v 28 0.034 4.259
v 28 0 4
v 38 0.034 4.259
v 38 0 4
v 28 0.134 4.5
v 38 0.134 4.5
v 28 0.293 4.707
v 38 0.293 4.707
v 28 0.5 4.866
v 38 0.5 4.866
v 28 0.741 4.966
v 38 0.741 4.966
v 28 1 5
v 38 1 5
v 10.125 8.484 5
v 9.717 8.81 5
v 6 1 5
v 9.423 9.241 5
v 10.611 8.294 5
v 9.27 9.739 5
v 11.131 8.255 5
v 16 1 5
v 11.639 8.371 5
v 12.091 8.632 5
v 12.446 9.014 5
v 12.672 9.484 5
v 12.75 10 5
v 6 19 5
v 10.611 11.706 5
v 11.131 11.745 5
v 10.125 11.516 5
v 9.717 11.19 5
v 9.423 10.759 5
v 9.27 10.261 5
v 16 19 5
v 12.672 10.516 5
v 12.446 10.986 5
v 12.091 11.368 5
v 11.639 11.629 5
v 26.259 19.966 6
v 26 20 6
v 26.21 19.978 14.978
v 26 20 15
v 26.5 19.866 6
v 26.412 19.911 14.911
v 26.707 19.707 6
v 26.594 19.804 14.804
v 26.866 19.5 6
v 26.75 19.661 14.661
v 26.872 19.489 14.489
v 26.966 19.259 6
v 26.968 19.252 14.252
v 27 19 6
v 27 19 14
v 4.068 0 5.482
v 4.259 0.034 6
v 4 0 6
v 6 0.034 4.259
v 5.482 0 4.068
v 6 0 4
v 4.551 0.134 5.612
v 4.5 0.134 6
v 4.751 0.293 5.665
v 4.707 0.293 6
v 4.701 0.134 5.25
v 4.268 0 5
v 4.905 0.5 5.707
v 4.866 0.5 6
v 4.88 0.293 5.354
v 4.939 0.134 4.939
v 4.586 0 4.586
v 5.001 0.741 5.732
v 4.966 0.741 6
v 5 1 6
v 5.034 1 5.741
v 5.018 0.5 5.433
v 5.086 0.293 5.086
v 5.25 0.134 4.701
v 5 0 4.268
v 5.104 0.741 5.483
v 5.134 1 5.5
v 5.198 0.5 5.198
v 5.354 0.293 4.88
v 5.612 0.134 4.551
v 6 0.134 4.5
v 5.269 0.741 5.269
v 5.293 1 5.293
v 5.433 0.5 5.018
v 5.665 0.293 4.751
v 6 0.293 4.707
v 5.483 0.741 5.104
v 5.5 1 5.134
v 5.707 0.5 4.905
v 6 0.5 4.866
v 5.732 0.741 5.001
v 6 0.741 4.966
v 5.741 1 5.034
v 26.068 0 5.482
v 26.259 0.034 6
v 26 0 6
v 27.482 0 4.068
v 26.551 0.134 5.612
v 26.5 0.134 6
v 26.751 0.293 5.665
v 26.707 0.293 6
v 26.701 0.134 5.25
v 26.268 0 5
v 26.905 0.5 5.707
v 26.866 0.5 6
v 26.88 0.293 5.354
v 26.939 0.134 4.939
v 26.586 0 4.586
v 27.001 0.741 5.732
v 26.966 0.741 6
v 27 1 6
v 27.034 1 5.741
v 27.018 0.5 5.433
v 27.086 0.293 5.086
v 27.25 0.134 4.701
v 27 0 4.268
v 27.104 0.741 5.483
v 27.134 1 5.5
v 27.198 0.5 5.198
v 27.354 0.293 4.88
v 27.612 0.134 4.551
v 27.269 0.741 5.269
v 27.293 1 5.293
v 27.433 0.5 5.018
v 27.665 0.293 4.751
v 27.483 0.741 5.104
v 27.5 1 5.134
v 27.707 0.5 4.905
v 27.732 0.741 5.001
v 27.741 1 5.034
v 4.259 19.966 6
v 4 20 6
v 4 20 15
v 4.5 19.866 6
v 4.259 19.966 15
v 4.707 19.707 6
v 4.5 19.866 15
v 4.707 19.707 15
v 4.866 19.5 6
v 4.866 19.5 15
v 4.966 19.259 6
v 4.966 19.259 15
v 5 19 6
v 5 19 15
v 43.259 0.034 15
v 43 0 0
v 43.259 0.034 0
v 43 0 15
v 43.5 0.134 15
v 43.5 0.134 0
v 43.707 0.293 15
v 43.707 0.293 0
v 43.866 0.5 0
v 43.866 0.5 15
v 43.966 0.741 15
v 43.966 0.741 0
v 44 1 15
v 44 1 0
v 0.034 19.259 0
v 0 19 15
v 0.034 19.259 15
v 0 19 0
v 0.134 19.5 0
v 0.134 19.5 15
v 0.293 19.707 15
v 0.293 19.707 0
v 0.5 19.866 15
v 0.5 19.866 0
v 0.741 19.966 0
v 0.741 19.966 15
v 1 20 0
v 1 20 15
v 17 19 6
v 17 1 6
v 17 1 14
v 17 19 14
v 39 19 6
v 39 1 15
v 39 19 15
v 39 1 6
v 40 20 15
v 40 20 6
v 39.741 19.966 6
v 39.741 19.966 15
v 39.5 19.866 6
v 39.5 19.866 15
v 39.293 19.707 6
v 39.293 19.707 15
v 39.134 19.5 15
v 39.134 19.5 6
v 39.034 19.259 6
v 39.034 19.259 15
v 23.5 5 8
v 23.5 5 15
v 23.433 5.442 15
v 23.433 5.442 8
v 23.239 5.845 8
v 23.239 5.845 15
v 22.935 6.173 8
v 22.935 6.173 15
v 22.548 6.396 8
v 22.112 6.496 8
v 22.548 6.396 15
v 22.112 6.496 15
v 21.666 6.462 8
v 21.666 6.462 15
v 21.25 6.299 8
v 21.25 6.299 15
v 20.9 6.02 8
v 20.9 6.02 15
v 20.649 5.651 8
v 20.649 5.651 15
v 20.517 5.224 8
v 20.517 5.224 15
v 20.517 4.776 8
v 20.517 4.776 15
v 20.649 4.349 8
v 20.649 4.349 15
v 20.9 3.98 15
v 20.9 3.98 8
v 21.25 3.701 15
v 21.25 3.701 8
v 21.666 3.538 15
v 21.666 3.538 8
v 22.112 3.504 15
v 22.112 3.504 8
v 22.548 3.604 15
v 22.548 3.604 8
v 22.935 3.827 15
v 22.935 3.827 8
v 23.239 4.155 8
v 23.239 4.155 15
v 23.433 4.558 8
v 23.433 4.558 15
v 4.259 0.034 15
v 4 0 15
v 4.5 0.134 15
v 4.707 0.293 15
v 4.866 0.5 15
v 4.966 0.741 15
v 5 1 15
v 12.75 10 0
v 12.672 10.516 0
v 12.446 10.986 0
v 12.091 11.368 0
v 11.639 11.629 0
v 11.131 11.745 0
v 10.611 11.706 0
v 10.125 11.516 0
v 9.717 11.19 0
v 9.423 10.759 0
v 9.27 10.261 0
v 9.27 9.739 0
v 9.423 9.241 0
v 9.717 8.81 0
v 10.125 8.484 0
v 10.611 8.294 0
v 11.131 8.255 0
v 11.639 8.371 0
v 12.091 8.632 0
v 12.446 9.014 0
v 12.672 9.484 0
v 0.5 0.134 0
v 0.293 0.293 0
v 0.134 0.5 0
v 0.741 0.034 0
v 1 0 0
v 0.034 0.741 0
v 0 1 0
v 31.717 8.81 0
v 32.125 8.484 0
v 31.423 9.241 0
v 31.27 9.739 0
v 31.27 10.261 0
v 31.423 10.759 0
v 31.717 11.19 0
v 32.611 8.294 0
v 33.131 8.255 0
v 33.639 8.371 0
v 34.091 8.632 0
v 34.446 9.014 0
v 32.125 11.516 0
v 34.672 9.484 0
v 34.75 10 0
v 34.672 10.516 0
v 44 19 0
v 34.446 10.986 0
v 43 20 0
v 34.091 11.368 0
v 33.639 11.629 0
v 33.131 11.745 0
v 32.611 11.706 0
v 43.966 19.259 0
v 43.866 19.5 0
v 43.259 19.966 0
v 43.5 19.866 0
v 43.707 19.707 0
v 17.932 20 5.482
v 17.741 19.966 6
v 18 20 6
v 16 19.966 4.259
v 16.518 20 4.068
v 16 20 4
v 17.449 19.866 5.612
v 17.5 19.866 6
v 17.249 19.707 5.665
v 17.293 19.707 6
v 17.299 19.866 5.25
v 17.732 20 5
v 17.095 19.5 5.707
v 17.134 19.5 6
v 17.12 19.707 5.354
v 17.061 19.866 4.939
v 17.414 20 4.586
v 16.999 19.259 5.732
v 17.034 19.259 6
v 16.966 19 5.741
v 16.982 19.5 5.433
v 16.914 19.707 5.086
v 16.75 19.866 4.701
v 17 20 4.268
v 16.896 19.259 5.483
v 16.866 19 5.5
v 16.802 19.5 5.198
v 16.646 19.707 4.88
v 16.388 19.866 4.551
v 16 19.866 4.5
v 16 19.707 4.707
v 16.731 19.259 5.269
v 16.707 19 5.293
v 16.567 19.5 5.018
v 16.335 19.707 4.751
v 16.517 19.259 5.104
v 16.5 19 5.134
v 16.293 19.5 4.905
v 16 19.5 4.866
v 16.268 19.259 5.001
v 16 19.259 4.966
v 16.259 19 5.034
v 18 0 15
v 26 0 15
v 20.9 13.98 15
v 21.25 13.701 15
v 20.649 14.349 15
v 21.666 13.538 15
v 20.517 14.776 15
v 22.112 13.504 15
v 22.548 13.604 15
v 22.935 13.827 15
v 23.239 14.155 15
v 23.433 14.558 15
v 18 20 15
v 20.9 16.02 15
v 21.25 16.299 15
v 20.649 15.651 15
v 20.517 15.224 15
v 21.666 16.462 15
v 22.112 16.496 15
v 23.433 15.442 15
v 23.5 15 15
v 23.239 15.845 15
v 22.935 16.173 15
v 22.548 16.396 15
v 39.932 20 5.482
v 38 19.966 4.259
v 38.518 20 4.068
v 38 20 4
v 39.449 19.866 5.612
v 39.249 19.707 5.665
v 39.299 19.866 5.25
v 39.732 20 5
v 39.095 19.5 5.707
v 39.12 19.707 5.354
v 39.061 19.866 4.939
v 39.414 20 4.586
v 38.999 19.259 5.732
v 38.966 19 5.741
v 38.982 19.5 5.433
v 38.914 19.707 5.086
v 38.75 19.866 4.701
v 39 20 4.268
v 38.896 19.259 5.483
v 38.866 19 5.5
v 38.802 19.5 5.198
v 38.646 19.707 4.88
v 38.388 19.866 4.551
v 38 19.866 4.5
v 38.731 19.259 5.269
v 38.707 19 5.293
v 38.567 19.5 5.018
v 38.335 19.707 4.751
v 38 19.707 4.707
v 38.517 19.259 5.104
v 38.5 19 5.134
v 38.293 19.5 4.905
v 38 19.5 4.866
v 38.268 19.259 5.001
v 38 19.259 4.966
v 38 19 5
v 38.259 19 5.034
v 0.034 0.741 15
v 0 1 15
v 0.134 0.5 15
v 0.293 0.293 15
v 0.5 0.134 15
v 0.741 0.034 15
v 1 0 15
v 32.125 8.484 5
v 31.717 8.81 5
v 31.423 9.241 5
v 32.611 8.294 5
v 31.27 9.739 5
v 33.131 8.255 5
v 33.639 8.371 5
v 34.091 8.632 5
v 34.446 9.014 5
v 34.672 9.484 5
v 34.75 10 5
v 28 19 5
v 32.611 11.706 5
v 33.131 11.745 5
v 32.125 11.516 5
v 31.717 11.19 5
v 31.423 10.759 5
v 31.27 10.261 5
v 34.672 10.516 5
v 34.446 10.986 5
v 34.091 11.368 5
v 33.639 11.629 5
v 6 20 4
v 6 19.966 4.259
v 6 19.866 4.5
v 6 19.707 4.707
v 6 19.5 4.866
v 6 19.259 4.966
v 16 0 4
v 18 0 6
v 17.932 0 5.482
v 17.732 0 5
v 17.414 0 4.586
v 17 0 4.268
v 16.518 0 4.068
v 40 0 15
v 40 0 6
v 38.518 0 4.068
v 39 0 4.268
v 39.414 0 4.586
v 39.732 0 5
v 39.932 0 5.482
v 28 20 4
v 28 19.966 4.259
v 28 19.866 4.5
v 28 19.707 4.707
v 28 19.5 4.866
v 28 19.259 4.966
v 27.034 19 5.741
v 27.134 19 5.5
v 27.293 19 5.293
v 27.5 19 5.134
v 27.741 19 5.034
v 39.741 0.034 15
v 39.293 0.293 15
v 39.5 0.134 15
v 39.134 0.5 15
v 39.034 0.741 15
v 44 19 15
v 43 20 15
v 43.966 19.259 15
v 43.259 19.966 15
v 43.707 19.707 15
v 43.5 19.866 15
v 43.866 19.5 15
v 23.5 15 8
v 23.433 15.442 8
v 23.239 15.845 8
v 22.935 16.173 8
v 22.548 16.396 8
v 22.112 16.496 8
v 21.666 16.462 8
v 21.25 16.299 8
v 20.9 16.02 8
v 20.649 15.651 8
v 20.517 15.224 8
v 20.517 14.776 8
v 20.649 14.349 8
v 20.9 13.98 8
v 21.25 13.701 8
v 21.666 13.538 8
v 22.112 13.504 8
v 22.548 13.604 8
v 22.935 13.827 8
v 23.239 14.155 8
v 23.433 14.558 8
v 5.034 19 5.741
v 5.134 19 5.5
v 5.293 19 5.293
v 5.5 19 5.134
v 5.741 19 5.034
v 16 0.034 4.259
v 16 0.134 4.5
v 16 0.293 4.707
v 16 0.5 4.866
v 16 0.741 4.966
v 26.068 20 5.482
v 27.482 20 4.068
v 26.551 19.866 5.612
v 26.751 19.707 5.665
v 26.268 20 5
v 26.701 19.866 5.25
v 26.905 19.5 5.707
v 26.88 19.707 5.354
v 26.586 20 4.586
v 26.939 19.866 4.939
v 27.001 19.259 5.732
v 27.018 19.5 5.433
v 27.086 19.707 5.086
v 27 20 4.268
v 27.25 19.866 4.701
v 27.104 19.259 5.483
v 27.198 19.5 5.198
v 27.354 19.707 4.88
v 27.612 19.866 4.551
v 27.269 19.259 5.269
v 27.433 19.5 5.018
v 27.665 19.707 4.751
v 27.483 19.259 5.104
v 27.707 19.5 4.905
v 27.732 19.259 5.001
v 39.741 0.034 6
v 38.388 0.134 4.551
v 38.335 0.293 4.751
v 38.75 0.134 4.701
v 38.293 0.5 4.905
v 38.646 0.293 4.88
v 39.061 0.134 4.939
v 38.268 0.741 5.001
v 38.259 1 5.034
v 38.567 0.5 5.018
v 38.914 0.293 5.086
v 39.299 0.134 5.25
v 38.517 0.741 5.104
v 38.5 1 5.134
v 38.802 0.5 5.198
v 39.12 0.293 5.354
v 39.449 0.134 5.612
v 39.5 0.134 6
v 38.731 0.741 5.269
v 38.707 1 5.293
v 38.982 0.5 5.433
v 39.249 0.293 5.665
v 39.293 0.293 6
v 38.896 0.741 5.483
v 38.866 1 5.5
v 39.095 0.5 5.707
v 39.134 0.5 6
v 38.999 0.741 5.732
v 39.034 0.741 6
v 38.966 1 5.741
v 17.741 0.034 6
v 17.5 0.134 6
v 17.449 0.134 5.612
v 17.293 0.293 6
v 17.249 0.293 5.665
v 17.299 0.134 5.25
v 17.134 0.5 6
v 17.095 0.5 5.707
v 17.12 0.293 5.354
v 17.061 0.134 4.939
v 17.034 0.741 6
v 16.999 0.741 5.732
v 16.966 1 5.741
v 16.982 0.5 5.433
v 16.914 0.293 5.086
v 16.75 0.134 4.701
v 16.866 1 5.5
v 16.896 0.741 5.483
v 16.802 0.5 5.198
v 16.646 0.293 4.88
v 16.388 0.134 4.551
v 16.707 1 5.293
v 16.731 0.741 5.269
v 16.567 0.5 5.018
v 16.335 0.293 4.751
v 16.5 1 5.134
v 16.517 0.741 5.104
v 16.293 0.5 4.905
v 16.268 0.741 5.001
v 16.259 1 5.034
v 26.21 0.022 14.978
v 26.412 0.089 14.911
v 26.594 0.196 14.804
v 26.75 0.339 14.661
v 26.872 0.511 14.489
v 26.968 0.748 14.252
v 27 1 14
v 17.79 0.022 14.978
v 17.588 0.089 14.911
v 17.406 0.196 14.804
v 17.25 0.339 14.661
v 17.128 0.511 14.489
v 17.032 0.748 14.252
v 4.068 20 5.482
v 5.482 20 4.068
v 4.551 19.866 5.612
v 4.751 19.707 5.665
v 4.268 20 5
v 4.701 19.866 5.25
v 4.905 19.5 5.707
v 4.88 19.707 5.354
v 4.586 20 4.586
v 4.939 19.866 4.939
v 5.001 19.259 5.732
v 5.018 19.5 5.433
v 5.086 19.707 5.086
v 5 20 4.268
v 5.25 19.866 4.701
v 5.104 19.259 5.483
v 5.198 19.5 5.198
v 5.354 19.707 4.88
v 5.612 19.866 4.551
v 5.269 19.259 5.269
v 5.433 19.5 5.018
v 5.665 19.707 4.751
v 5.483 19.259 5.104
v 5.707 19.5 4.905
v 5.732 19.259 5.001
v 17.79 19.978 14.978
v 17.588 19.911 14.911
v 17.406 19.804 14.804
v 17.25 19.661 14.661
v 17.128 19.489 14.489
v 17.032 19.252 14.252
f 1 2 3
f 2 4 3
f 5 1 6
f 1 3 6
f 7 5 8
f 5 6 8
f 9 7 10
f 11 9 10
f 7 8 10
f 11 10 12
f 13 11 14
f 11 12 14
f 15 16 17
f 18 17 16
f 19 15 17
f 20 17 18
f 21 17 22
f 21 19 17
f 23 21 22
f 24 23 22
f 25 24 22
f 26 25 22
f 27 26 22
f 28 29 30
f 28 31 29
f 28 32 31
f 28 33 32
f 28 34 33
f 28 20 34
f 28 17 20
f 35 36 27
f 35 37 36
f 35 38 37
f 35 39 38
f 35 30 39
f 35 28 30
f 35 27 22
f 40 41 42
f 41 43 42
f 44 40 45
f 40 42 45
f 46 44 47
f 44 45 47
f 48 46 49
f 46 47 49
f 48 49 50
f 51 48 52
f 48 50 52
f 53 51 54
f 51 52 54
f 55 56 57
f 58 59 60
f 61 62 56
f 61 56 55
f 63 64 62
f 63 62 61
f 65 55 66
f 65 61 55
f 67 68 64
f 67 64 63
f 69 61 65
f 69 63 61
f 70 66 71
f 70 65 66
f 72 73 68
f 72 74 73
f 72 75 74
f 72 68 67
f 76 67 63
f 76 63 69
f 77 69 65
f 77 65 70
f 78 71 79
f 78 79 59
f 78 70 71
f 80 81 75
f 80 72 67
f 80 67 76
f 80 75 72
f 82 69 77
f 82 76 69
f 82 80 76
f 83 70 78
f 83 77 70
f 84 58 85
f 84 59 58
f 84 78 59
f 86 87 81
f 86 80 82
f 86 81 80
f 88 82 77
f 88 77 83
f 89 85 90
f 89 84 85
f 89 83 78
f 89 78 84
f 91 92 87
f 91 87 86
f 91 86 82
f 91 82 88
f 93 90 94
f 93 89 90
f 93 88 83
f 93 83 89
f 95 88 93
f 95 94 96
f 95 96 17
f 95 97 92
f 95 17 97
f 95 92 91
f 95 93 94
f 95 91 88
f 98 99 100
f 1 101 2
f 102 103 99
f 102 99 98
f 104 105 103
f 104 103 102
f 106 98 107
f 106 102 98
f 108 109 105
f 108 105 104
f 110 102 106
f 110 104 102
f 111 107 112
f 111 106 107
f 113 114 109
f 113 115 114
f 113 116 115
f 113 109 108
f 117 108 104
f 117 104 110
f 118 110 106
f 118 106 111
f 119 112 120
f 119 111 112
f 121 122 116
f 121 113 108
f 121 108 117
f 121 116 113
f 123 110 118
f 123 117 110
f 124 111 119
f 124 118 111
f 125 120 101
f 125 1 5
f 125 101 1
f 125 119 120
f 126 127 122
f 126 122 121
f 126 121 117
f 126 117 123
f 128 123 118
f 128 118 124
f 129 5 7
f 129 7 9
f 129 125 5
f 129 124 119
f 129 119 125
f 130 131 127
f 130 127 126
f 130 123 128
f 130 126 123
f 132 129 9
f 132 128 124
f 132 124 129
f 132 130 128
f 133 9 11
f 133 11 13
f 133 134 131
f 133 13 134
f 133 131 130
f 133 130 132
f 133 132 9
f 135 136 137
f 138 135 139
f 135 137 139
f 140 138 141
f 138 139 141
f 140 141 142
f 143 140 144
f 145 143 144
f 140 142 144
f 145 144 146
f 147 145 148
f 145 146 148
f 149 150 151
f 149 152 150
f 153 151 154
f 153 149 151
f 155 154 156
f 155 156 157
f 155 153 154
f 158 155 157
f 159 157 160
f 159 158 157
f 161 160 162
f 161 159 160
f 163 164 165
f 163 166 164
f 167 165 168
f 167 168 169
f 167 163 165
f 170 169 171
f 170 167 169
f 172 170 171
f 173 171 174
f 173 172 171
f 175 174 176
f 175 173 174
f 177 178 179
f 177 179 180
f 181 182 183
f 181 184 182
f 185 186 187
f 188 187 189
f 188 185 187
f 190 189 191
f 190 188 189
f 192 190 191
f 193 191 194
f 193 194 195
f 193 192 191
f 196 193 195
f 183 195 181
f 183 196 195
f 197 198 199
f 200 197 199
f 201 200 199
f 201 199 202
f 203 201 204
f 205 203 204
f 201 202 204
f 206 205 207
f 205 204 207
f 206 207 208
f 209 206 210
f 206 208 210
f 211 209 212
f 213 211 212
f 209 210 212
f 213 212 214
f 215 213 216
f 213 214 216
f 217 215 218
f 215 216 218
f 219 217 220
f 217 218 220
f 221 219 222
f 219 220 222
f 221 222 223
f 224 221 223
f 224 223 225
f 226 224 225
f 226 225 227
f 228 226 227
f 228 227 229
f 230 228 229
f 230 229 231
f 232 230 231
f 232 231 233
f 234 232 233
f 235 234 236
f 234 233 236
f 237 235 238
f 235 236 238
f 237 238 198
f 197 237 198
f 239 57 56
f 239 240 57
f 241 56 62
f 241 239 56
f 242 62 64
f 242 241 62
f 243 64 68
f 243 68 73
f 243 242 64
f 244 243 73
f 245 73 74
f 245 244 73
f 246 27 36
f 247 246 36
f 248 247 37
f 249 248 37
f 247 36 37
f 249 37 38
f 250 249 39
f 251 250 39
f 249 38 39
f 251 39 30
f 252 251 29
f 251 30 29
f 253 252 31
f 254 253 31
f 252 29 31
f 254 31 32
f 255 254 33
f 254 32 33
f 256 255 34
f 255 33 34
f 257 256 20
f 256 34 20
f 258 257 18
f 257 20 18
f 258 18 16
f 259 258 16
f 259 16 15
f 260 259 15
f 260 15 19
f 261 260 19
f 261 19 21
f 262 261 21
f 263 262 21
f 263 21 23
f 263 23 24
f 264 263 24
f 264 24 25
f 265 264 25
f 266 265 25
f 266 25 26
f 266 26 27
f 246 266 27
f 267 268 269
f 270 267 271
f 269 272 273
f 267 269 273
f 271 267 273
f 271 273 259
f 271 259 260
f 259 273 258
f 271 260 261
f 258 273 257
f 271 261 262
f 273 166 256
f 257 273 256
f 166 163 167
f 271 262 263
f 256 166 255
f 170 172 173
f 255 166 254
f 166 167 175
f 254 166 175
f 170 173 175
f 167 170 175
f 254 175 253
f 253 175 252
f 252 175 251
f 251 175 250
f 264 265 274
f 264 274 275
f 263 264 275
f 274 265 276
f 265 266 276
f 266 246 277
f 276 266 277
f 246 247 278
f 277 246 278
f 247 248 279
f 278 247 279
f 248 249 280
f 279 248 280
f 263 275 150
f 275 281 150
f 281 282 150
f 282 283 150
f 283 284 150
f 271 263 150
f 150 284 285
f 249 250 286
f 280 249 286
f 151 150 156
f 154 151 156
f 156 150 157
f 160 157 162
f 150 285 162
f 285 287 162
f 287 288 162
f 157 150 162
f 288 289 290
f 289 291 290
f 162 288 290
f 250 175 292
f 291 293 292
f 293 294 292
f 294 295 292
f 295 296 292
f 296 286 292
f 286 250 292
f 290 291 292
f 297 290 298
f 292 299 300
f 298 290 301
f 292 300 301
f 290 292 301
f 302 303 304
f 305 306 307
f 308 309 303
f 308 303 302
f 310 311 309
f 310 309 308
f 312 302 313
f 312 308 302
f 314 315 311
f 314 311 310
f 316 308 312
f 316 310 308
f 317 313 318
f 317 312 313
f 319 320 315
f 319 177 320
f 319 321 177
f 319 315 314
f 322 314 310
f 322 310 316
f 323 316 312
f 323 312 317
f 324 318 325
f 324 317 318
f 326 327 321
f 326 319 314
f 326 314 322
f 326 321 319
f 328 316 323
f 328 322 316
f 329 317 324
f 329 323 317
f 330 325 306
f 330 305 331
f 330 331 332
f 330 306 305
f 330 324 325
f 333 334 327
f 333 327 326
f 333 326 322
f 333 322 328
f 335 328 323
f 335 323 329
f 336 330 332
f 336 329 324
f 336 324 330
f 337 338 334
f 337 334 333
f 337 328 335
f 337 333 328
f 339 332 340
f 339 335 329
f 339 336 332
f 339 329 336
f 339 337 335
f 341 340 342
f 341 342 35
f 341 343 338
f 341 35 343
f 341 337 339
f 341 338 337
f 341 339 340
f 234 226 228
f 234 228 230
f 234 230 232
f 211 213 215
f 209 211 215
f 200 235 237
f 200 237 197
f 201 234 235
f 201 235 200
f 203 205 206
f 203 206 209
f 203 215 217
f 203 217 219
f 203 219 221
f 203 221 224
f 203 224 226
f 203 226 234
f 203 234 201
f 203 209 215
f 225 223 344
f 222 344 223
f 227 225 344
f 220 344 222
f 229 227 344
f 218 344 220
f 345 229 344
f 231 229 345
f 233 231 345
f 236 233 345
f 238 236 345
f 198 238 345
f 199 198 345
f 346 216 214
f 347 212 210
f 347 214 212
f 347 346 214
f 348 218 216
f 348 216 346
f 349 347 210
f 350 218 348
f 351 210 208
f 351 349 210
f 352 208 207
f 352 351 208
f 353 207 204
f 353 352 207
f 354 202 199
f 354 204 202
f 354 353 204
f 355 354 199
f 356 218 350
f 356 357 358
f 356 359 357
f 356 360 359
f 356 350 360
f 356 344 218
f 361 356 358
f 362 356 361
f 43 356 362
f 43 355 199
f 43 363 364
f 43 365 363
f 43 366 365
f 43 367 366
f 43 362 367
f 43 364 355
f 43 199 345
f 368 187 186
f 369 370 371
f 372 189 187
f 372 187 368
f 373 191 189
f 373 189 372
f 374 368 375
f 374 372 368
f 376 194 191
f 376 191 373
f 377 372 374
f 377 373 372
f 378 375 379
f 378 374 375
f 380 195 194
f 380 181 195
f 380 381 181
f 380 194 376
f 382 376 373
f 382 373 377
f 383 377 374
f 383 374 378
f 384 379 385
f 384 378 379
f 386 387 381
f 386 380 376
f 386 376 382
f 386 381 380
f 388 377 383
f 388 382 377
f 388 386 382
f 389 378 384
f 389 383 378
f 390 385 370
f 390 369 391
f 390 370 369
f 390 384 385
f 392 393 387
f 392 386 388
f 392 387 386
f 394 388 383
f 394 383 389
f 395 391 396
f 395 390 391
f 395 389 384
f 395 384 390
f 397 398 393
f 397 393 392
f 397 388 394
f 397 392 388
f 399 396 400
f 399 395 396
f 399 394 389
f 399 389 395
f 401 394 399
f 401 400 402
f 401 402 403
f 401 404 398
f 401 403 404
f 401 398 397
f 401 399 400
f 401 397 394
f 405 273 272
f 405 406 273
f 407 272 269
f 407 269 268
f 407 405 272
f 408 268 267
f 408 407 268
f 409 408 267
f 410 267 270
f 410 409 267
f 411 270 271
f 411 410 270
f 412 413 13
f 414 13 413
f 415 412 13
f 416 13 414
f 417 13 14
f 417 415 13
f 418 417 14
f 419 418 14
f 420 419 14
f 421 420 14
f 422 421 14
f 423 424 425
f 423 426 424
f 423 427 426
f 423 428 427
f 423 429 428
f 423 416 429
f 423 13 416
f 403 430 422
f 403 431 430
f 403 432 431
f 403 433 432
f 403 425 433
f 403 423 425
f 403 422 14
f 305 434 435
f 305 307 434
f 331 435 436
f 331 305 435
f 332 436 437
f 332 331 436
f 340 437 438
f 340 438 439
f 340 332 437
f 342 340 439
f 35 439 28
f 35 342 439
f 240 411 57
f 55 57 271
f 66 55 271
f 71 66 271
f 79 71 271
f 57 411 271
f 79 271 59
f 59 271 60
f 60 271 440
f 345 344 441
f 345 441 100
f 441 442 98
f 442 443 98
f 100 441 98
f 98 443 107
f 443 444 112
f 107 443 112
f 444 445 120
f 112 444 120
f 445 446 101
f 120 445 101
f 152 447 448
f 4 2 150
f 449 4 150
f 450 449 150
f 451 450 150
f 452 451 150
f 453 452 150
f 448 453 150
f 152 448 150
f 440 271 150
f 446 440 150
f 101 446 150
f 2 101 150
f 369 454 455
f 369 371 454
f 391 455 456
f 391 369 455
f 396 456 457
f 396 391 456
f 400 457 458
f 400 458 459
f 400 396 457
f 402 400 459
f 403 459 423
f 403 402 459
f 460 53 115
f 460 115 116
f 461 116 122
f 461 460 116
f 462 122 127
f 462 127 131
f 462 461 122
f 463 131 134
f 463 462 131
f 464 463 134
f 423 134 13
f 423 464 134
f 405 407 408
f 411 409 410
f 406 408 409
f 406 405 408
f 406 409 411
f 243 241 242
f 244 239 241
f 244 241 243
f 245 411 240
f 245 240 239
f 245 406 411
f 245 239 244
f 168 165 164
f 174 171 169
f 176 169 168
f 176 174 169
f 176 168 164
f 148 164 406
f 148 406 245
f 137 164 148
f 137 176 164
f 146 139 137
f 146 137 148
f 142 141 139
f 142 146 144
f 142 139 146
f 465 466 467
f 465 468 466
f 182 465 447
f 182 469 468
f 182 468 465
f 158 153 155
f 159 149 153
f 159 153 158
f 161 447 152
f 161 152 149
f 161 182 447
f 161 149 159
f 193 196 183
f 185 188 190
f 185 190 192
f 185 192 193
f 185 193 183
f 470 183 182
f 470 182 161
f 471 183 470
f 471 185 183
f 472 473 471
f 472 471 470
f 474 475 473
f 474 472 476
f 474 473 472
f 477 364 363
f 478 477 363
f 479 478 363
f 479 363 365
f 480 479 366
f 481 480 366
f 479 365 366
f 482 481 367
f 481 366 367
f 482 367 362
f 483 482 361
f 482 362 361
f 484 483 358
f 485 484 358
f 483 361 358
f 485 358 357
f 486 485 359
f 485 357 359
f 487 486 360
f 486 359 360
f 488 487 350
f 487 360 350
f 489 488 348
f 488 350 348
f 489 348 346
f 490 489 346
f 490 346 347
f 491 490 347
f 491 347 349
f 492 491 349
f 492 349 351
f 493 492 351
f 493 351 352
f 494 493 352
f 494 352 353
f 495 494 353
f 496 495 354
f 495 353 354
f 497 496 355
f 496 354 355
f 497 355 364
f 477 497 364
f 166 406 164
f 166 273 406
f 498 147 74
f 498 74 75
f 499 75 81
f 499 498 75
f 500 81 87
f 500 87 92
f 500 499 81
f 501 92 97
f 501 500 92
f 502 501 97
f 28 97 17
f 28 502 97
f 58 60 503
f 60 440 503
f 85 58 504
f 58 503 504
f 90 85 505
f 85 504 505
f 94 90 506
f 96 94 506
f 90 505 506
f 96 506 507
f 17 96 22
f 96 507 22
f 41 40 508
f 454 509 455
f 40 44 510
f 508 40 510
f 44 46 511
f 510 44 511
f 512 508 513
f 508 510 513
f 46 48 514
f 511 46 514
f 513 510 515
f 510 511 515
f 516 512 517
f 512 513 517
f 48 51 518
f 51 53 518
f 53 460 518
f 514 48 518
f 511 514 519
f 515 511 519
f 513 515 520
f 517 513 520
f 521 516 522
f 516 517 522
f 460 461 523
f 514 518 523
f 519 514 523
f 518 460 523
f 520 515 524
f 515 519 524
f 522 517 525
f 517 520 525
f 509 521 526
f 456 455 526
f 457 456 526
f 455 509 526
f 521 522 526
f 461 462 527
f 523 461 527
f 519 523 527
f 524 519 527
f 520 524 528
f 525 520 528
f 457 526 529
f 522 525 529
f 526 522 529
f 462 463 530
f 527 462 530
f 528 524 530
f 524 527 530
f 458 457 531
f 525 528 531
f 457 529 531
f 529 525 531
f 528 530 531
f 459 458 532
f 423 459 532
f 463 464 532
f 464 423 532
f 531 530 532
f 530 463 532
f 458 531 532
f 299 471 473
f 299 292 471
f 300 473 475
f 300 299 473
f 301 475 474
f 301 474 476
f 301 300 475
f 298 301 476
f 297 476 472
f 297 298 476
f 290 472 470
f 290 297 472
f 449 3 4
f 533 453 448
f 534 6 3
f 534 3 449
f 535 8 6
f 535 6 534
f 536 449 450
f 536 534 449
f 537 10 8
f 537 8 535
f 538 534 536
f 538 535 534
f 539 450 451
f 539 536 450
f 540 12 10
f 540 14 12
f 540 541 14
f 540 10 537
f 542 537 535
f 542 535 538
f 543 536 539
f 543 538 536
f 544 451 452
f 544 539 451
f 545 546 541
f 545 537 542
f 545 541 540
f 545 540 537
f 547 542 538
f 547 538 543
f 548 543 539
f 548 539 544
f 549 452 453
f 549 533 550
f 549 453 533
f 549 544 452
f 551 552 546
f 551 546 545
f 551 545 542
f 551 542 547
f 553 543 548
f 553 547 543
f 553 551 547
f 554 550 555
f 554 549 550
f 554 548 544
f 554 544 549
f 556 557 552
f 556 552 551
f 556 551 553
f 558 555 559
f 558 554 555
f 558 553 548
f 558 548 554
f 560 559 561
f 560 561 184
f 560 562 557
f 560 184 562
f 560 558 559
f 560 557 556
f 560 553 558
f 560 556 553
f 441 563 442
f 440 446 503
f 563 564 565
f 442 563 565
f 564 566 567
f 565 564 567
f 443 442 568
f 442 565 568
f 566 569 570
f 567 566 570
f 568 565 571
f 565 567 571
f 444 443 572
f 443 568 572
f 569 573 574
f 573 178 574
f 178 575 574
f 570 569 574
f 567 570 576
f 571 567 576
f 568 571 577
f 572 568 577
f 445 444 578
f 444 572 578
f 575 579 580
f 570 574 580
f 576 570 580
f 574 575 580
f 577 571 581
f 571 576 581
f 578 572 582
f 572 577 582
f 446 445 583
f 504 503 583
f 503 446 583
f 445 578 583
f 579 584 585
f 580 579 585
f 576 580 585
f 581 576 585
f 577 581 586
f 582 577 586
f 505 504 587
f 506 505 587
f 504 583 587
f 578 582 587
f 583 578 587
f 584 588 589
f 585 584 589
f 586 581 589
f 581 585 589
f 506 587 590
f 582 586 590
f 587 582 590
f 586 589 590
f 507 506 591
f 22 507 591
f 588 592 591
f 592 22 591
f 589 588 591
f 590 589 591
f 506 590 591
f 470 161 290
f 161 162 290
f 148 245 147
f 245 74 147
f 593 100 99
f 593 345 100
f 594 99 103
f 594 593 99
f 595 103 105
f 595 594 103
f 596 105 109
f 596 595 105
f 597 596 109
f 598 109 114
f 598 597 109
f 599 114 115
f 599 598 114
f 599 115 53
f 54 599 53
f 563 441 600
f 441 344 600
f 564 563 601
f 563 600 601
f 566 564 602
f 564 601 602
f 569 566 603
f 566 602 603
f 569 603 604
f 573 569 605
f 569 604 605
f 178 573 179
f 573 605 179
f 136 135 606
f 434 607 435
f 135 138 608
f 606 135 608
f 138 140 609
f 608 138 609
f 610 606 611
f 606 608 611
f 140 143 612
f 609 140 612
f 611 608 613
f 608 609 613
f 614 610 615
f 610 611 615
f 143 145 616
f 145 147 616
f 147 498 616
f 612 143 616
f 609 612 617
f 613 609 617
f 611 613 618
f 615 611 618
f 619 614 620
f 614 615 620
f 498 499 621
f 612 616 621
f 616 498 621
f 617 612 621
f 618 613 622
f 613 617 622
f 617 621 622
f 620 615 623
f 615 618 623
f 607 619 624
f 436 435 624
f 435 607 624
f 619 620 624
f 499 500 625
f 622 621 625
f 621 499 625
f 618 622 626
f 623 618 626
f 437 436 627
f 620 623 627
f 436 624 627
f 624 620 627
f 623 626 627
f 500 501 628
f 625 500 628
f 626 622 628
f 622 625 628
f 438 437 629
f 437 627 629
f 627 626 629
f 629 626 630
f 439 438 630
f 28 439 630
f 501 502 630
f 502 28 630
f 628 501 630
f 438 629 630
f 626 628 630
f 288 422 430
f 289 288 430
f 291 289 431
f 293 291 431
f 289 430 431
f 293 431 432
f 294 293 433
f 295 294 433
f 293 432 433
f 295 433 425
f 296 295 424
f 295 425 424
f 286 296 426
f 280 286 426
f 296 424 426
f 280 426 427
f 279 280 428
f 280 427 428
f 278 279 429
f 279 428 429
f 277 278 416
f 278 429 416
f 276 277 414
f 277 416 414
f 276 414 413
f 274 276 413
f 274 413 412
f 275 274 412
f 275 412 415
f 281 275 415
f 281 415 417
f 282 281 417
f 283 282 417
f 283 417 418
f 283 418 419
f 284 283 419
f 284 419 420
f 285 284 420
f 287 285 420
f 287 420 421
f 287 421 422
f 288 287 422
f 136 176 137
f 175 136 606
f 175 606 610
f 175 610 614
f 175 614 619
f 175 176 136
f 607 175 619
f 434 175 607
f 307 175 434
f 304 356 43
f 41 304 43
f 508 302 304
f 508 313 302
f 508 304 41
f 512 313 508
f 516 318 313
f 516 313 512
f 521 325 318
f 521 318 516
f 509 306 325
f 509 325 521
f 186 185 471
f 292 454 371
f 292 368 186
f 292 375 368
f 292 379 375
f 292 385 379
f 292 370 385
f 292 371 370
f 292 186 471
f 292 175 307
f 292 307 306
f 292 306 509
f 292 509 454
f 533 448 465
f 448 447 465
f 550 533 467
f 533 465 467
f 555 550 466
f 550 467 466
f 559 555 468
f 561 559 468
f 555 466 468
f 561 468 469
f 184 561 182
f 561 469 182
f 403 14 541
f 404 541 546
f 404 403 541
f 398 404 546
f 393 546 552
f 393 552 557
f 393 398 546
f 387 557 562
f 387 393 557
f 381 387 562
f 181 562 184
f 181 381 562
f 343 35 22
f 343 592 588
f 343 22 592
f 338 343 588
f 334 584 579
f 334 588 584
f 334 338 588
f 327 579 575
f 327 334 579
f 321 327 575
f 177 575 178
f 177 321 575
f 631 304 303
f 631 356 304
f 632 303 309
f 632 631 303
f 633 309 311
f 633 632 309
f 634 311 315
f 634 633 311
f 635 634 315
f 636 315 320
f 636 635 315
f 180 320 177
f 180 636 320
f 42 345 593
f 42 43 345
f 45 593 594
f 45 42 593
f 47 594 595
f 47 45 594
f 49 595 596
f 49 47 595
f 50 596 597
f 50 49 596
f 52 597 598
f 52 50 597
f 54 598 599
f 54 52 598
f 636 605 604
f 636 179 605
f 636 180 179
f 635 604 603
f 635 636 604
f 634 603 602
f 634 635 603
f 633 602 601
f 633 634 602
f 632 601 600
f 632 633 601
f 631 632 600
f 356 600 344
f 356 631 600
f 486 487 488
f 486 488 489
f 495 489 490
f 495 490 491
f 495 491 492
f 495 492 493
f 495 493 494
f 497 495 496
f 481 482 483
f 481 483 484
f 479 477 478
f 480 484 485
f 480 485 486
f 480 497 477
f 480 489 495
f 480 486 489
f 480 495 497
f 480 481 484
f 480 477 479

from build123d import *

# Parameters (mm, degrees)
SKETCH1_W           = 44
SKETCH1_H           = 20
BOSS_EXTRUDE1_DEPTH = 5
SKETCH2_W           = 5
SKETCH2_H           = 20
SKETCH2_W_2         = 10
BOSS_EXTRUDE2_DEPTH = 10
CUT_EXTRUDE1_REACH  = 51.356
SKETCH4_R           = 1.75
SKETCH5_R           = 1.5
CUT_EXTRUDE2_DEPTH  = 7
FILLET1_R           = 1


with BuildPart() as part:
    # Sketch1 → Boss-Extrude1 (new body)
    with BuildSketch(Plane.XY):
        with Locations((22, 10)):
            Rectangle(SKETCH1_W, SKETCH1_H)
    extrude(amount=BOSS_EXTRUDE1_DEPTH)

    # Sketch2 → Boss-Extrude2 (add)
    with BuildSketch(Plane.XY.offset(5)):
        with Locations((2.5, 10)):
            Rectangle(SKETCH2_W, SKETCH2_H)
        with Locations((22, 10)):
            Rectangle(SKETCH2_W_2, SKETCH2_H)
        with Locations((41.5, 10)):
            Rectangle(SKETCH2_W, SKETCH2_H)
    extrude(amount=BOSS_EXTRUDE2_DEPTH)

    # Sketch4 → Cut-Extrude1 (cut, up to next)
    with BuildSketch(Plane.XY.offset(5), mode=Mode.PRIVATE) as cut_extrude1_sk1:
        with Locations((11, 10)):
            Circle(SKETCH4_R)
    cut_extrude1_tool1 = extrude(cut_extrude1_sk1.sketch, amount=-CUT_EXTRUDE1_REACH, mode=Mode.PRIVATE) & part.part
    # Sketch4 → Cut-Extrude1 (cut, up to next)
    with BuildSketch(Plane.XY.offset(5), mode=Mode.PRIVATE) as cut_extrude1_sk2:
        with Locations((33, 10)):
            Circle(SKETCH4_R)
    cut_extrude1_tool2 = extrude(cut_extrude1_sk2.sketch, amount=-CUT_EXTRUDE1_REACH, mode=Mode.PRIVATE) & part.part
    add(cut_extrude1_tool1.solids().sort_by_distance((11, 10, 5))[0], mode=Mode.SUBTRACT)
    add(cut_extrude1_tool2.solids().sort_by_distance((33, 10, 5))[0], mode=Mode.SUBTRACT)

    # Sketch5 → Cut-Extrude2 (cut)
    with BuildSketch(Plane.XY.offset(15)):
        with Locations((22, 15)):
            Circle(SKETCH5_R)
        with Locations((22, 5)):
            Circle(SKETCH5_R)
    extrude(amount=-CUT_EXTRUDE2_DEPTH, mode=Mode.SUBTRACT)

    # Fillet1
    fillet1_edges = [part.edges().sort_by_distance(p)[0] for p in [
        (11, 0, 5),
        (5, 10, 5),
        (5, 0, 10),
        (5, 20, 10),
        (33, 0, 5),
        (11, 20, 5),
        (17, 10, 5),
        (17, 20, 10),
        (17, 0, 10),
        (27, 10, 5),
        (27, 0, 10),
        (27, 20, 10),
        (17, 10, 15),
        (27, 10, 15),
        (33, 20, 5),
        (39, 0, 10),
        (39, 10, 5),
        (39, 20, 10),
        (0, 20, 7.5),
        (44, 20, 7.5),
        (44, 0, 7.5),
        (0, 0, 7.5),
    ]]
    fillet(fillet1_edges, radius=FILLET1_R)


solid = part.part
